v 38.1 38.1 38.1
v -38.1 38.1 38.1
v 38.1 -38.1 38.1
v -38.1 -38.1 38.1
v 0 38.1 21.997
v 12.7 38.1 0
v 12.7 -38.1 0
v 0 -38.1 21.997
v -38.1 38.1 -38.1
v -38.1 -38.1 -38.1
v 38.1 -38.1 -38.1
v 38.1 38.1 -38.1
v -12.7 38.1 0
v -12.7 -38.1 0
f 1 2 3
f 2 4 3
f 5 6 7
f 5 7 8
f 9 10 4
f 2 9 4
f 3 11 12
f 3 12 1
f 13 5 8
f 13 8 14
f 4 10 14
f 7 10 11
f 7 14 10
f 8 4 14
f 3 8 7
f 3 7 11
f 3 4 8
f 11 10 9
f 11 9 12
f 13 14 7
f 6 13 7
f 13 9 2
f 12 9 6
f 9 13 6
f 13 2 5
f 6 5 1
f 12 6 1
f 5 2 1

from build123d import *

# Parameters (mm, degrees)
F0_W     = 76.2
F0_H     = 76.2
F1_DEPTH = 38.1
F3_DEPTH = 76.201


with BuildPart() as f1:
    # F0 (on Front) → F1 (new body, symmetric)
    with BuildSketch(Plane.XZ):
        Rectangle(F0_W, F0_H)
    extrude(amount=F1_DEPTH, both=True)

    # F2 (on face) → F3 (cut, through all)
    with BuildSketch(Plane.XZ.offset(38.1)):
        Polygon((0, 21.997045), (-12.7, 0), (12.7, 0), align=None)
    extrude(amount=-F3_DEPTH, mode=Mode.SUBTRACT)


solid = f1.part
